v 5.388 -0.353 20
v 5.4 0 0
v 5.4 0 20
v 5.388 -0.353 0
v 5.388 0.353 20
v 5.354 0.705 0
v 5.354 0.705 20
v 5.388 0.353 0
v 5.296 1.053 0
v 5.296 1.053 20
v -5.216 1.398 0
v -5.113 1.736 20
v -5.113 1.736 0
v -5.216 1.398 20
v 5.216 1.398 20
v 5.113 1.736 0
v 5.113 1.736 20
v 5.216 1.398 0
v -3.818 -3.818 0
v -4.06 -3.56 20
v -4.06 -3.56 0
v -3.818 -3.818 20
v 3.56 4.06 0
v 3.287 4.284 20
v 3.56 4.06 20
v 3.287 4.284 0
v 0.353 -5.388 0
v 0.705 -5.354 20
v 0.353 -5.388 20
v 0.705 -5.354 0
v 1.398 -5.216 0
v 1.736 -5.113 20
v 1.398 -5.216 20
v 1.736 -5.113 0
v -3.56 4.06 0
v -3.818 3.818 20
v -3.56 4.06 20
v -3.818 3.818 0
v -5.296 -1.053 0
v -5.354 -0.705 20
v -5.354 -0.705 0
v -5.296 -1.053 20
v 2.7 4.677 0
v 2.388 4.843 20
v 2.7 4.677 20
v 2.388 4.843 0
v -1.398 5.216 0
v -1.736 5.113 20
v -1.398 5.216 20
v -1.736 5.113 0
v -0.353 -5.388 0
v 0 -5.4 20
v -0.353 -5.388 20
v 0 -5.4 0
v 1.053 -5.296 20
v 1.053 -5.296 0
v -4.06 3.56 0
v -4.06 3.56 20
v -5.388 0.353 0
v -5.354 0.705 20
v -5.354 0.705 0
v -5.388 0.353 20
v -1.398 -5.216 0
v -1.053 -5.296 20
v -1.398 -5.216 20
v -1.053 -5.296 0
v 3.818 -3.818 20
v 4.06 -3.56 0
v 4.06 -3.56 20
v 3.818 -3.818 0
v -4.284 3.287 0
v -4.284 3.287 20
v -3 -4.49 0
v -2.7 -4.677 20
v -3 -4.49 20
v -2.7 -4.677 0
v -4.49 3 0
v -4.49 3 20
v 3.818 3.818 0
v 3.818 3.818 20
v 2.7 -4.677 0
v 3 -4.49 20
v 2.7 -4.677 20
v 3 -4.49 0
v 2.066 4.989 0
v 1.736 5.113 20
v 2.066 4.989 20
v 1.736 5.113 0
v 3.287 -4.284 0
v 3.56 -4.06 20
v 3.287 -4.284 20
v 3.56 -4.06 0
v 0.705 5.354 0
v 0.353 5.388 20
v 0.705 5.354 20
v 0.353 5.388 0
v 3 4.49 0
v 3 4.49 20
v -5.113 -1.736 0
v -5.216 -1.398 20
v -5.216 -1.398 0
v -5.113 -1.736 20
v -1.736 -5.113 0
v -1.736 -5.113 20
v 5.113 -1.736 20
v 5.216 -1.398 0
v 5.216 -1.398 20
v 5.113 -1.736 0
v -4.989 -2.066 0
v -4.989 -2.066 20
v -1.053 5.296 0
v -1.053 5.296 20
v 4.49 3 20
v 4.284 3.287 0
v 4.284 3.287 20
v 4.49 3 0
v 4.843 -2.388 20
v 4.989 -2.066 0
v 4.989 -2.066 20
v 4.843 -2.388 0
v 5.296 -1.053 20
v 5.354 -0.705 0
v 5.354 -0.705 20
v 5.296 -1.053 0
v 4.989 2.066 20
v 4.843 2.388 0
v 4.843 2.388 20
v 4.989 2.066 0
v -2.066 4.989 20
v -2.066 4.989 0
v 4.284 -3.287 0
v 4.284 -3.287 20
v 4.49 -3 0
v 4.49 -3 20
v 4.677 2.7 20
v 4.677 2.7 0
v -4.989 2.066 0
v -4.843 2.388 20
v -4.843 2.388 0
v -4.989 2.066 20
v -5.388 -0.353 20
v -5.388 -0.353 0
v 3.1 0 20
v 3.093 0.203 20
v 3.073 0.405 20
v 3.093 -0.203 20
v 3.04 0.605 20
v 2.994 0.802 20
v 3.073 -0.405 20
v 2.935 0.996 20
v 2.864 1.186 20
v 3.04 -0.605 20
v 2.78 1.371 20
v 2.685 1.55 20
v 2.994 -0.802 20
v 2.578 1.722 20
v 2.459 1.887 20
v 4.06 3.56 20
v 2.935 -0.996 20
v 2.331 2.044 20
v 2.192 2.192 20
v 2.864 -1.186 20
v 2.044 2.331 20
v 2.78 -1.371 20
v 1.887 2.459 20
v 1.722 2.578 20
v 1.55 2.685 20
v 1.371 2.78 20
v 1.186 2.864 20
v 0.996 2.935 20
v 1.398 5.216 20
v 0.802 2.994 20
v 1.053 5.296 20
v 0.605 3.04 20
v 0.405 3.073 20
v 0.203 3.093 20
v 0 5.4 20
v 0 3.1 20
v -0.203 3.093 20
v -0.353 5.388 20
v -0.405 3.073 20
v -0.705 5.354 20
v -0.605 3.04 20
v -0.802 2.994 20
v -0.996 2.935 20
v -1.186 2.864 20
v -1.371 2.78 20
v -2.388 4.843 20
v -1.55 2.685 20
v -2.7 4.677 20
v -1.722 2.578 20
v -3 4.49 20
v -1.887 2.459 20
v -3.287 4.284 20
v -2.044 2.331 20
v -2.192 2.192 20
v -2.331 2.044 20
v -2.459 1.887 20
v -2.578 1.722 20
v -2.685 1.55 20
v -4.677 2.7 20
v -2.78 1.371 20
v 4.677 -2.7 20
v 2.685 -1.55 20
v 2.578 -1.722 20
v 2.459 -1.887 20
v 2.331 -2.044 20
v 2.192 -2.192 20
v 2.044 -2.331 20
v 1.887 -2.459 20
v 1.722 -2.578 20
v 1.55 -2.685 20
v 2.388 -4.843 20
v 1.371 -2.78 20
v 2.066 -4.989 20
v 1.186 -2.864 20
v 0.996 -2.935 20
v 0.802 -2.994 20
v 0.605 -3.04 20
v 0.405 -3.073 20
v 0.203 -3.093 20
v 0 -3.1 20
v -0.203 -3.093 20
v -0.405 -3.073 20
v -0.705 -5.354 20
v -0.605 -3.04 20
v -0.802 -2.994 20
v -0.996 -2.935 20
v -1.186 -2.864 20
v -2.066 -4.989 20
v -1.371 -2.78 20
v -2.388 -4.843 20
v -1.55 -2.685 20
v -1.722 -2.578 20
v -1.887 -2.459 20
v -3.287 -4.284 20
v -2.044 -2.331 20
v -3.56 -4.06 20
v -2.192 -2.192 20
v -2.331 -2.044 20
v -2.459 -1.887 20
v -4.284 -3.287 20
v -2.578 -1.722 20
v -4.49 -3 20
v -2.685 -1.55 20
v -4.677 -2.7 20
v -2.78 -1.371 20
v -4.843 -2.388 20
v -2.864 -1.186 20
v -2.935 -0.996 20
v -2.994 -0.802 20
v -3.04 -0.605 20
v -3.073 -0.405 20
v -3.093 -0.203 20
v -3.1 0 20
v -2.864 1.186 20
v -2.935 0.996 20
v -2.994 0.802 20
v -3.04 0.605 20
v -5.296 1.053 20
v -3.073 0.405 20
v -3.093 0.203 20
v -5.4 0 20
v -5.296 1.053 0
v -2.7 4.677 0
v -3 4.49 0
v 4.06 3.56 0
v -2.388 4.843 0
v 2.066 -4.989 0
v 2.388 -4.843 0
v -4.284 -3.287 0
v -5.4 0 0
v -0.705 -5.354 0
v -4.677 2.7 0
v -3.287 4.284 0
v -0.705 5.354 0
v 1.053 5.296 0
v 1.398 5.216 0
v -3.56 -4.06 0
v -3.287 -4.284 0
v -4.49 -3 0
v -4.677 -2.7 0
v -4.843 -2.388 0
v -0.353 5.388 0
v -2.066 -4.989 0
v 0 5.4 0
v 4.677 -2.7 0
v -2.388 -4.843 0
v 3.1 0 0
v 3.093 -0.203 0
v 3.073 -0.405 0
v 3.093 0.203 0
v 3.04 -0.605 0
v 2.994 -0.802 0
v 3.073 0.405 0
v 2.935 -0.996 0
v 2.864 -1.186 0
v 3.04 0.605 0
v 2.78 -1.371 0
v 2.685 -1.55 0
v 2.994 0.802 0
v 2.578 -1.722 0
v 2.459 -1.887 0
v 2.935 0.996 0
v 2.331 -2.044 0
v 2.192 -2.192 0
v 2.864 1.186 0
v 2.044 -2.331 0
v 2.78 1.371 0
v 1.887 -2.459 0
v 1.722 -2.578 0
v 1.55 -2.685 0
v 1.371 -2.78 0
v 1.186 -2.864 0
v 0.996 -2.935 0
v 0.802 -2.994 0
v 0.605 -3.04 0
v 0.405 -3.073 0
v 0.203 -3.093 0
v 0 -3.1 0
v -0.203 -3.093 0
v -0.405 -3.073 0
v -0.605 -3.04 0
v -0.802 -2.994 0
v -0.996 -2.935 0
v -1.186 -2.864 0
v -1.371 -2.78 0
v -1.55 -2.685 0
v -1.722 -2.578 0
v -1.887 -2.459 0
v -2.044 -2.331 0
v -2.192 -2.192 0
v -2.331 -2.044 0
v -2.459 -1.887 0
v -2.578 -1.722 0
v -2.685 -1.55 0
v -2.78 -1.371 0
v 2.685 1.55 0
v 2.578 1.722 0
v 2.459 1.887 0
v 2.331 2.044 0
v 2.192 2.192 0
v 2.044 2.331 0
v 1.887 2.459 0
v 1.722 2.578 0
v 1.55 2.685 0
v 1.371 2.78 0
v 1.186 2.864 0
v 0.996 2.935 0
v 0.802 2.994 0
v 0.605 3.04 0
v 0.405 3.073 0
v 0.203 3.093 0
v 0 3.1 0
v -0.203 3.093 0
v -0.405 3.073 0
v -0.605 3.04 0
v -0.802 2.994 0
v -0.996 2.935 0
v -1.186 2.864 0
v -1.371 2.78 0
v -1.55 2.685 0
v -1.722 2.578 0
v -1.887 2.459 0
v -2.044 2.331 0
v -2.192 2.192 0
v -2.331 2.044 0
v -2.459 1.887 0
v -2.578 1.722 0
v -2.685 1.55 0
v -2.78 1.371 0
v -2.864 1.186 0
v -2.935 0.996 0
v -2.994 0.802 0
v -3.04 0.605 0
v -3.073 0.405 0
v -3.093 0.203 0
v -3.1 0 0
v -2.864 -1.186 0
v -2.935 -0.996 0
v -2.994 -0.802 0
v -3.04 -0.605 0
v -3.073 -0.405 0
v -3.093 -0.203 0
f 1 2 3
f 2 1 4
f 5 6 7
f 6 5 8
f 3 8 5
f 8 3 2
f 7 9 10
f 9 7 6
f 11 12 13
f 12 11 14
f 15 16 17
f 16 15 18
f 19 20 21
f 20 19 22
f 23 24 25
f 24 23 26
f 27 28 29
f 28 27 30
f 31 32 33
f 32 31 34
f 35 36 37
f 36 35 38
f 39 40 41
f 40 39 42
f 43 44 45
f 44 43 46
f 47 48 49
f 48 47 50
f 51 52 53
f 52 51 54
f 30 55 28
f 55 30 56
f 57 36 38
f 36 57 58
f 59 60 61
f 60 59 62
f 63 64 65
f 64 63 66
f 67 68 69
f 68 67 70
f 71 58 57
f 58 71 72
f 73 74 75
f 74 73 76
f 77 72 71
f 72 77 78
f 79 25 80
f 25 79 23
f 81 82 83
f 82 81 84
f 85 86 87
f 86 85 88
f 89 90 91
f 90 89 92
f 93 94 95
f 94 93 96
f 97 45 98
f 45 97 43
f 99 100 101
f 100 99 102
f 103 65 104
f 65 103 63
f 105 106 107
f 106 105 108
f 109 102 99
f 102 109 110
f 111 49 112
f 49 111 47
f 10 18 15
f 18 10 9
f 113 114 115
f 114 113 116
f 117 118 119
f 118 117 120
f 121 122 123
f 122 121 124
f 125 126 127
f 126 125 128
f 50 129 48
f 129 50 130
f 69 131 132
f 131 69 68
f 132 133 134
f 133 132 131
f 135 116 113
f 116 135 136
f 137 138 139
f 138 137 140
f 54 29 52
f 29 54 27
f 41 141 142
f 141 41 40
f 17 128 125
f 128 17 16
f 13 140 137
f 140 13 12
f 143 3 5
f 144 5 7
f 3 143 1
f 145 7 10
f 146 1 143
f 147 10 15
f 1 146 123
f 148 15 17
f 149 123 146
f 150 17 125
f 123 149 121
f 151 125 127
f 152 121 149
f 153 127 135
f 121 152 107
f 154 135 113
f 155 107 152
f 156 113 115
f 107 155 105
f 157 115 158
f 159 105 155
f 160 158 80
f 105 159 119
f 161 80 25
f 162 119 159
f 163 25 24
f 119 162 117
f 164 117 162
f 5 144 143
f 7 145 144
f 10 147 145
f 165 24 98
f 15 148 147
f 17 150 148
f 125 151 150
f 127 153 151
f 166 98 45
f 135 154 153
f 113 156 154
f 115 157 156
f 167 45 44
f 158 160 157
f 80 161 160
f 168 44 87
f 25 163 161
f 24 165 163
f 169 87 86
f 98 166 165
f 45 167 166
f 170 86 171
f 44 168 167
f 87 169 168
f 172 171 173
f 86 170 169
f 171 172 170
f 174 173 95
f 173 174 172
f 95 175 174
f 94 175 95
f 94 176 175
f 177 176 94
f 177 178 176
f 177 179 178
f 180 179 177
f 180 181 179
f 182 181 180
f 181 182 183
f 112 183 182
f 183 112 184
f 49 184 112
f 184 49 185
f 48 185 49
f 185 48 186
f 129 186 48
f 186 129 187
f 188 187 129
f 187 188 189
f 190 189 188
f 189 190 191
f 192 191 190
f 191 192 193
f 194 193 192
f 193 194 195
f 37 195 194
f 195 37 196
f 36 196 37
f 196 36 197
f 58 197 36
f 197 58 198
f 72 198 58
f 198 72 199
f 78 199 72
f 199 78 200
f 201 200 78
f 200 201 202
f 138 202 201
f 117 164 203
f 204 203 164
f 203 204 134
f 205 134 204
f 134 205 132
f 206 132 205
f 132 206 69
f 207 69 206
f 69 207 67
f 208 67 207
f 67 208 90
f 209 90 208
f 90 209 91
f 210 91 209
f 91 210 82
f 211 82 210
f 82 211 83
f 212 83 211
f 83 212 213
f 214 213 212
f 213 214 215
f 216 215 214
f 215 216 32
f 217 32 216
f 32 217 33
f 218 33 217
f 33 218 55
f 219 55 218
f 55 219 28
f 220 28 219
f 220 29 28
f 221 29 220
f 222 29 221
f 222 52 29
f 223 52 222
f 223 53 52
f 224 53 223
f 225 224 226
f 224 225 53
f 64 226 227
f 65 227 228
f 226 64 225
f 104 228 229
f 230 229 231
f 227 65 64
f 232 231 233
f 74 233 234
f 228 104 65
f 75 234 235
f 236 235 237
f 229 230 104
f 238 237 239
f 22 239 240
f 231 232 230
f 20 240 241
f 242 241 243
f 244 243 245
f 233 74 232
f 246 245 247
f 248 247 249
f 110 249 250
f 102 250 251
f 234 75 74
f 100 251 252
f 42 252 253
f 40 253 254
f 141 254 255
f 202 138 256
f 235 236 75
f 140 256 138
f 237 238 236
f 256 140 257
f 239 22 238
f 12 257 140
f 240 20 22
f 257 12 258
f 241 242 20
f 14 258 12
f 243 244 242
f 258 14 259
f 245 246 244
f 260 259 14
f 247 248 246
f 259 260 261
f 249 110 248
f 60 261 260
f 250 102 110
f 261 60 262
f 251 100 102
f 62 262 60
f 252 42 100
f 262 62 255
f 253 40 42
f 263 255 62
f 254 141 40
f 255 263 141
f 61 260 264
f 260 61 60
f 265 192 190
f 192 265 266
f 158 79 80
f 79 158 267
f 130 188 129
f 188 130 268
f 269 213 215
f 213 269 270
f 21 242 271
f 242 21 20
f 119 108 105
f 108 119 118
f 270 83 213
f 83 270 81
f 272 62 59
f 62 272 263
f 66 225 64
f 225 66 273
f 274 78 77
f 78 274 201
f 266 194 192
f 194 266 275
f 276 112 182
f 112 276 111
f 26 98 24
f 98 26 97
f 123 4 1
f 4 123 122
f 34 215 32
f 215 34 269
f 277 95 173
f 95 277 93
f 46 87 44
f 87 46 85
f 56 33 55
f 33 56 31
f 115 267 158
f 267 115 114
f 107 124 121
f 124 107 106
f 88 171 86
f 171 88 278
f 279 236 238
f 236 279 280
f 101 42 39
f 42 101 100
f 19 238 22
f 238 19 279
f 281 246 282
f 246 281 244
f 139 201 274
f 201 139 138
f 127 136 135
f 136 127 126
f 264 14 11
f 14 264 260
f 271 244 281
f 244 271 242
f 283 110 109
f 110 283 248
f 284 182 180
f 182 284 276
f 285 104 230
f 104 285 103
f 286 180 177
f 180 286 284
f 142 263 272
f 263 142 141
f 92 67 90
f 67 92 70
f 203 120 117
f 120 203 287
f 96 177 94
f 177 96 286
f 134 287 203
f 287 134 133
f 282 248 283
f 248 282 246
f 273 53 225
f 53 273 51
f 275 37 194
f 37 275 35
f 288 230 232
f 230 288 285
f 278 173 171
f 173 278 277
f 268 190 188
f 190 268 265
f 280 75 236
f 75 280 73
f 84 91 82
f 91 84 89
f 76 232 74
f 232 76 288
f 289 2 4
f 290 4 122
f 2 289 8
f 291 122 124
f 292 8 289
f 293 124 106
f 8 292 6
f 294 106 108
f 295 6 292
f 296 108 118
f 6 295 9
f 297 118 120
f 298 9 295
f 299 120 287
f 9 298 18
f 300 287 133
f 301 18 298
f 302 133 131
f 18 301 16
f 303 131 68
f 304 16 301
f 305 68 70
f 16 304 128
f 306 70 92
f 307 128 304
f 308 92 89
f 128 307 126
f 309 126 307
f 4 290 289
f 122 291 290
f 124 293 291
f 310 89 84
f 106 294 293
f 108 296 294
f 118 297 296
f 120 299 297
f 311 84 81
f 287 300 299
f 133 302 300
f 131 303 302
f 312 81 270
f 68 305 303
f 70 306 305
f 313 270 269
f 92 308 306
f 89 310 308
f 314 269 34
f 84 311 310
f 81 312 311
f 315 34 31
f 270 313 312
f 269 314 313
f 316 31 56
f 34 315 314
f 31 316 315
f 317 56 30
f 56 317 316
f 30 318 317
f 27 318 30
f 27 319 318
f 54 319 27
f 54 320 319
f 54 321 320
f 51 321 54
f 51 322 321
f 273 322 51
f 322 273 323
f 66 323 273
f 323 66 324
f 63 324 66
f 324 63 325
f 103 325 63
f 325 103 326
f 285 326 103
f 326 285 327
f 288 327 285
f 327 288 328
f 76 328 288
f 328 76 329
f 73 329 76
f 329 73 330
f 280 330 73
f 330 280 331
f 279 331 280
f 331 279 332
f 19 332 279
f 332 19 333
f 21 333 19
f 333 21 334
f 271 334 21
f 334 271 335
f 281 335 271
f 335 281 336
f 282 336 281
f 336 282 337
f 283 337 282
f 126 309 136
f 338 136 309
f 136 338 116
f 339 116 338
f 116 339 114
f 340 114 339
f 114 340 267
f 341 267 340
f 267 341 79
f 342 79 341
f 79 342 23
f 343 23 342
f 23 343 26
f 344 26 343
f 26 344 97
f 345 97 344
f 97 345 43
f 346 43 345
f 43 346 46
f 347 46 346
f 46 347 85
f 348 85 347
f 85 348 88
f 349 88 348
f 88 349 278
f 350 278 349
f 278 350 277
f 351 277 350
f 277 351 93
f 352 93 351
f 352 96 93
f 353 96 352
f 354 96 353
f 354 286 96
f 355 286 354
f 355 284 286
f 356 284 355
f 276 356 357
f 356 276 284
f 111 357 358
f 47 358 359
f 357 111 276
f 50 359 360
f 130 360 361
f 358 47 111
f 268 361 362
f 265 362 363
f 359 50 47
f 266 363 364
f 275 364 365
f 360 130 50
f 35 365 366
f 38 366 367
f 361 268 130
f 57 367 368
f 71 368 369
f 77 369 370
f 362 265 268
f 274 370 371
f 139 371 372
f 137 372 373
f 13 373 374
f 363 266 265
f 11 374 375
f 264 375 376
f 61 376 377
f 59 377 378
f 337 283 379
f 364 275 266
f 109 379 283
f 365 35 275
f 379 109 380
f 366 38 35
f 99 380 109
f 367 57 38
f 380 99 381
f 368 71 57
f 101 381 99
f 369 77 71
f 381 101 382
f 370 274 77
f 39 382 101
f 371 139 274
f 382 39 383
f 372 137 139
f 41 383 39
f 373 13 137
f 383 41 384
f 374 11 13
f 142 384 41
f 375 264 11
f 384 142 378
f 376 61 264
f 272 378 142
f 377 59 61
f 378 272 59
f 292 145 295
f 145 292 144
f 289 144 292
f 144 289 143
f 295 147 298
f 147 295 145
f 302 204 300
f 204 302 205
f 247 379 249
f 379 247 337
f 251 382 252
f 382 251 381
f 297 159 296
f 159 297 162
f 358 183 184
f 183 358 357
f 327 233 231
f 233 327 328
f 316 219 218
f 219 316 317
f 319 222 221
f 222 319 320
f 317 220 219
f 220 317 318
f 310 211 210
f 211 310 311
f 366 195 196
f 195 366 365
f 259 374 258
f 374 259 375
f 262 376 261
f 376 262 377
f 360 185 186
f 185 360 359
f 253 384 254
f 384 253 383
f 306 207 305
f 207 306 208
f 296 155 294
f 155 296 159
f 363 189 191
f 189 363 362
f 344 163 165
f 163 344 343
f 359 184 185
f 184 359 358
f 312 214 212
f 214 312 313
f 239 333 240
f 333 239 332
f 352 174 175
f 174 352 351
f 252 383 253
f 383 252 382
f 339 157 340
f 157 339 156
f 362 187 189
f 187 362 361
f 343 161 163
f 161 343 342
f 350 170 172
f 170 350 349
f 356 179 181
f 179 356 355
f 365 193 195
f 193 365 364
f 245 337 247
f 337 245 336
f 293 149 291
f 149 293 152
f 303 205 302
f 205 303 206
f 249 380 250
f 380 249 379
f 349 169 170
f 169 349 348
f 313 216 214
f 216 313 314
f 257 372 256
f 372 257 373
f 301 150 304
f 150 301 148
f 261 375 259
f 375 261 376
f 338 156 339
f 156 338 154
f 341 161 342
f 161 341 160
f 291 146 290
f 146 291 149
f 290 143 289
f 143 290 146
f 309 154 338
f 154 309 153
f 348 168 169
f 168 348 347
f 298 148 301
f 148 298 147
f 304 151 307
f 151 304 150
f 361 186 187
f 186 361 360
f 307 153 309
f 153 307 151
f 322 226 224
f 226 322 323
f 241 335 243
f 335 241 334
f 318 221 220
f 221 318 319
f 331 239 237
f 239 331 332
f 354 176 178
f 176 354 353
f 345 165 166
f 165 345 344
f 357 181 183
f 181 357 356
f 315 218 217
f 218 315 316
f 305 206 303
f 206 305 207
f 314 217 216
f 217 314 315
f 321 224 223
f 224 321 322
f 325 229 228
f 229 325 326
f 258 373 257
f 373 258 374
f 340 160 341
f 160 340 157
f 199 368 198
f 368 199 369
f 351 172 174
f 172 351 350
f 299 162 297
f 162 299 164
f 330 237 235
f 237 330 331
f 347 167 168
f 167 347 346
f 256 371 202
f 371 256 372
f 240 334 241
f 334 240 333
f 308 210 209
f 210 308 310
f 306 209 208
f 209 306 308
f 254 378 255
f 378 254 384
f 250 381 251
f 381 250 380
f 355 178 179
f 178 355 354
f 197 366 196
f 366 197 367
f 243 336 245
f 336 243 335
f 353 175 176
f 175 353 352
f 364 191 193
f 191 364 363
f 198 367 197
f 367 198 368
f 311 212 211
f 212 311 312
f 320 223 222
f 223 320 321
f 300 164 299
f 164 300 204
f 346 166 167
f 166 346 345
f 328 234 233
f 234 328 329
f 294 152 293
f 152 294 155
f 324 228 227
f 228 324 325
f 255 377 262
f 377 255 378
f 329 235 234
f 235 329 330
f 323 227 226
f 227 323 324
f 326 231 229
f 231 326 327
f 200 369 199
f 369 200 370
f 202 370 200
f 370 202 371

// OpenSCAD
// PCR Tube Adapter Sleeve - fits 0.2mL tubes into 1.5mL rack holes.
// Print orientation: Collar on bed (z=0 to 1.5), body rises to z=21.5.

// Dimensions
collar_od = 13;      // Collar outer diameter
collar_t  = 1.5;     // Collar thickness (height)
body_od   = 10.8;    // Sleeve body outer diameter
body_h    = 20.0;    // Sleeve body height (Total height 21.5 - Collar 1.5)
bore_d    = 6.2;     // Bore diameter

// Derived dimensions
total_height = collar_t + body_h; // Must equal 21.5

// Ensure smooth rendering for cylindrical surfaces
$fn = 96;

module adapter() {
    difference() {
        // 1. Main Body Cylinder (Outer Shell)
        // Starts at z=0, goes up to total_height
        cylinder(h = total_height, d = body_od);

        // 2. Collar (Outer Ring)
        // Starts at z=0, goes up to collar_t
        // We subtract this from the main body to create the step down
        cylinder(h = collar_t, d = collar_od);

        // 3. Bore (Inner Hole)
        // Runs through the full height of the part
        translate([0, 0, -1]) cylinder(h = total_height + 2, d = bore_d);
    }
}

// Translate the whole part down so the collar sits on the bed (z=0)
translate([0, 0, -collar_t]) adapter();
